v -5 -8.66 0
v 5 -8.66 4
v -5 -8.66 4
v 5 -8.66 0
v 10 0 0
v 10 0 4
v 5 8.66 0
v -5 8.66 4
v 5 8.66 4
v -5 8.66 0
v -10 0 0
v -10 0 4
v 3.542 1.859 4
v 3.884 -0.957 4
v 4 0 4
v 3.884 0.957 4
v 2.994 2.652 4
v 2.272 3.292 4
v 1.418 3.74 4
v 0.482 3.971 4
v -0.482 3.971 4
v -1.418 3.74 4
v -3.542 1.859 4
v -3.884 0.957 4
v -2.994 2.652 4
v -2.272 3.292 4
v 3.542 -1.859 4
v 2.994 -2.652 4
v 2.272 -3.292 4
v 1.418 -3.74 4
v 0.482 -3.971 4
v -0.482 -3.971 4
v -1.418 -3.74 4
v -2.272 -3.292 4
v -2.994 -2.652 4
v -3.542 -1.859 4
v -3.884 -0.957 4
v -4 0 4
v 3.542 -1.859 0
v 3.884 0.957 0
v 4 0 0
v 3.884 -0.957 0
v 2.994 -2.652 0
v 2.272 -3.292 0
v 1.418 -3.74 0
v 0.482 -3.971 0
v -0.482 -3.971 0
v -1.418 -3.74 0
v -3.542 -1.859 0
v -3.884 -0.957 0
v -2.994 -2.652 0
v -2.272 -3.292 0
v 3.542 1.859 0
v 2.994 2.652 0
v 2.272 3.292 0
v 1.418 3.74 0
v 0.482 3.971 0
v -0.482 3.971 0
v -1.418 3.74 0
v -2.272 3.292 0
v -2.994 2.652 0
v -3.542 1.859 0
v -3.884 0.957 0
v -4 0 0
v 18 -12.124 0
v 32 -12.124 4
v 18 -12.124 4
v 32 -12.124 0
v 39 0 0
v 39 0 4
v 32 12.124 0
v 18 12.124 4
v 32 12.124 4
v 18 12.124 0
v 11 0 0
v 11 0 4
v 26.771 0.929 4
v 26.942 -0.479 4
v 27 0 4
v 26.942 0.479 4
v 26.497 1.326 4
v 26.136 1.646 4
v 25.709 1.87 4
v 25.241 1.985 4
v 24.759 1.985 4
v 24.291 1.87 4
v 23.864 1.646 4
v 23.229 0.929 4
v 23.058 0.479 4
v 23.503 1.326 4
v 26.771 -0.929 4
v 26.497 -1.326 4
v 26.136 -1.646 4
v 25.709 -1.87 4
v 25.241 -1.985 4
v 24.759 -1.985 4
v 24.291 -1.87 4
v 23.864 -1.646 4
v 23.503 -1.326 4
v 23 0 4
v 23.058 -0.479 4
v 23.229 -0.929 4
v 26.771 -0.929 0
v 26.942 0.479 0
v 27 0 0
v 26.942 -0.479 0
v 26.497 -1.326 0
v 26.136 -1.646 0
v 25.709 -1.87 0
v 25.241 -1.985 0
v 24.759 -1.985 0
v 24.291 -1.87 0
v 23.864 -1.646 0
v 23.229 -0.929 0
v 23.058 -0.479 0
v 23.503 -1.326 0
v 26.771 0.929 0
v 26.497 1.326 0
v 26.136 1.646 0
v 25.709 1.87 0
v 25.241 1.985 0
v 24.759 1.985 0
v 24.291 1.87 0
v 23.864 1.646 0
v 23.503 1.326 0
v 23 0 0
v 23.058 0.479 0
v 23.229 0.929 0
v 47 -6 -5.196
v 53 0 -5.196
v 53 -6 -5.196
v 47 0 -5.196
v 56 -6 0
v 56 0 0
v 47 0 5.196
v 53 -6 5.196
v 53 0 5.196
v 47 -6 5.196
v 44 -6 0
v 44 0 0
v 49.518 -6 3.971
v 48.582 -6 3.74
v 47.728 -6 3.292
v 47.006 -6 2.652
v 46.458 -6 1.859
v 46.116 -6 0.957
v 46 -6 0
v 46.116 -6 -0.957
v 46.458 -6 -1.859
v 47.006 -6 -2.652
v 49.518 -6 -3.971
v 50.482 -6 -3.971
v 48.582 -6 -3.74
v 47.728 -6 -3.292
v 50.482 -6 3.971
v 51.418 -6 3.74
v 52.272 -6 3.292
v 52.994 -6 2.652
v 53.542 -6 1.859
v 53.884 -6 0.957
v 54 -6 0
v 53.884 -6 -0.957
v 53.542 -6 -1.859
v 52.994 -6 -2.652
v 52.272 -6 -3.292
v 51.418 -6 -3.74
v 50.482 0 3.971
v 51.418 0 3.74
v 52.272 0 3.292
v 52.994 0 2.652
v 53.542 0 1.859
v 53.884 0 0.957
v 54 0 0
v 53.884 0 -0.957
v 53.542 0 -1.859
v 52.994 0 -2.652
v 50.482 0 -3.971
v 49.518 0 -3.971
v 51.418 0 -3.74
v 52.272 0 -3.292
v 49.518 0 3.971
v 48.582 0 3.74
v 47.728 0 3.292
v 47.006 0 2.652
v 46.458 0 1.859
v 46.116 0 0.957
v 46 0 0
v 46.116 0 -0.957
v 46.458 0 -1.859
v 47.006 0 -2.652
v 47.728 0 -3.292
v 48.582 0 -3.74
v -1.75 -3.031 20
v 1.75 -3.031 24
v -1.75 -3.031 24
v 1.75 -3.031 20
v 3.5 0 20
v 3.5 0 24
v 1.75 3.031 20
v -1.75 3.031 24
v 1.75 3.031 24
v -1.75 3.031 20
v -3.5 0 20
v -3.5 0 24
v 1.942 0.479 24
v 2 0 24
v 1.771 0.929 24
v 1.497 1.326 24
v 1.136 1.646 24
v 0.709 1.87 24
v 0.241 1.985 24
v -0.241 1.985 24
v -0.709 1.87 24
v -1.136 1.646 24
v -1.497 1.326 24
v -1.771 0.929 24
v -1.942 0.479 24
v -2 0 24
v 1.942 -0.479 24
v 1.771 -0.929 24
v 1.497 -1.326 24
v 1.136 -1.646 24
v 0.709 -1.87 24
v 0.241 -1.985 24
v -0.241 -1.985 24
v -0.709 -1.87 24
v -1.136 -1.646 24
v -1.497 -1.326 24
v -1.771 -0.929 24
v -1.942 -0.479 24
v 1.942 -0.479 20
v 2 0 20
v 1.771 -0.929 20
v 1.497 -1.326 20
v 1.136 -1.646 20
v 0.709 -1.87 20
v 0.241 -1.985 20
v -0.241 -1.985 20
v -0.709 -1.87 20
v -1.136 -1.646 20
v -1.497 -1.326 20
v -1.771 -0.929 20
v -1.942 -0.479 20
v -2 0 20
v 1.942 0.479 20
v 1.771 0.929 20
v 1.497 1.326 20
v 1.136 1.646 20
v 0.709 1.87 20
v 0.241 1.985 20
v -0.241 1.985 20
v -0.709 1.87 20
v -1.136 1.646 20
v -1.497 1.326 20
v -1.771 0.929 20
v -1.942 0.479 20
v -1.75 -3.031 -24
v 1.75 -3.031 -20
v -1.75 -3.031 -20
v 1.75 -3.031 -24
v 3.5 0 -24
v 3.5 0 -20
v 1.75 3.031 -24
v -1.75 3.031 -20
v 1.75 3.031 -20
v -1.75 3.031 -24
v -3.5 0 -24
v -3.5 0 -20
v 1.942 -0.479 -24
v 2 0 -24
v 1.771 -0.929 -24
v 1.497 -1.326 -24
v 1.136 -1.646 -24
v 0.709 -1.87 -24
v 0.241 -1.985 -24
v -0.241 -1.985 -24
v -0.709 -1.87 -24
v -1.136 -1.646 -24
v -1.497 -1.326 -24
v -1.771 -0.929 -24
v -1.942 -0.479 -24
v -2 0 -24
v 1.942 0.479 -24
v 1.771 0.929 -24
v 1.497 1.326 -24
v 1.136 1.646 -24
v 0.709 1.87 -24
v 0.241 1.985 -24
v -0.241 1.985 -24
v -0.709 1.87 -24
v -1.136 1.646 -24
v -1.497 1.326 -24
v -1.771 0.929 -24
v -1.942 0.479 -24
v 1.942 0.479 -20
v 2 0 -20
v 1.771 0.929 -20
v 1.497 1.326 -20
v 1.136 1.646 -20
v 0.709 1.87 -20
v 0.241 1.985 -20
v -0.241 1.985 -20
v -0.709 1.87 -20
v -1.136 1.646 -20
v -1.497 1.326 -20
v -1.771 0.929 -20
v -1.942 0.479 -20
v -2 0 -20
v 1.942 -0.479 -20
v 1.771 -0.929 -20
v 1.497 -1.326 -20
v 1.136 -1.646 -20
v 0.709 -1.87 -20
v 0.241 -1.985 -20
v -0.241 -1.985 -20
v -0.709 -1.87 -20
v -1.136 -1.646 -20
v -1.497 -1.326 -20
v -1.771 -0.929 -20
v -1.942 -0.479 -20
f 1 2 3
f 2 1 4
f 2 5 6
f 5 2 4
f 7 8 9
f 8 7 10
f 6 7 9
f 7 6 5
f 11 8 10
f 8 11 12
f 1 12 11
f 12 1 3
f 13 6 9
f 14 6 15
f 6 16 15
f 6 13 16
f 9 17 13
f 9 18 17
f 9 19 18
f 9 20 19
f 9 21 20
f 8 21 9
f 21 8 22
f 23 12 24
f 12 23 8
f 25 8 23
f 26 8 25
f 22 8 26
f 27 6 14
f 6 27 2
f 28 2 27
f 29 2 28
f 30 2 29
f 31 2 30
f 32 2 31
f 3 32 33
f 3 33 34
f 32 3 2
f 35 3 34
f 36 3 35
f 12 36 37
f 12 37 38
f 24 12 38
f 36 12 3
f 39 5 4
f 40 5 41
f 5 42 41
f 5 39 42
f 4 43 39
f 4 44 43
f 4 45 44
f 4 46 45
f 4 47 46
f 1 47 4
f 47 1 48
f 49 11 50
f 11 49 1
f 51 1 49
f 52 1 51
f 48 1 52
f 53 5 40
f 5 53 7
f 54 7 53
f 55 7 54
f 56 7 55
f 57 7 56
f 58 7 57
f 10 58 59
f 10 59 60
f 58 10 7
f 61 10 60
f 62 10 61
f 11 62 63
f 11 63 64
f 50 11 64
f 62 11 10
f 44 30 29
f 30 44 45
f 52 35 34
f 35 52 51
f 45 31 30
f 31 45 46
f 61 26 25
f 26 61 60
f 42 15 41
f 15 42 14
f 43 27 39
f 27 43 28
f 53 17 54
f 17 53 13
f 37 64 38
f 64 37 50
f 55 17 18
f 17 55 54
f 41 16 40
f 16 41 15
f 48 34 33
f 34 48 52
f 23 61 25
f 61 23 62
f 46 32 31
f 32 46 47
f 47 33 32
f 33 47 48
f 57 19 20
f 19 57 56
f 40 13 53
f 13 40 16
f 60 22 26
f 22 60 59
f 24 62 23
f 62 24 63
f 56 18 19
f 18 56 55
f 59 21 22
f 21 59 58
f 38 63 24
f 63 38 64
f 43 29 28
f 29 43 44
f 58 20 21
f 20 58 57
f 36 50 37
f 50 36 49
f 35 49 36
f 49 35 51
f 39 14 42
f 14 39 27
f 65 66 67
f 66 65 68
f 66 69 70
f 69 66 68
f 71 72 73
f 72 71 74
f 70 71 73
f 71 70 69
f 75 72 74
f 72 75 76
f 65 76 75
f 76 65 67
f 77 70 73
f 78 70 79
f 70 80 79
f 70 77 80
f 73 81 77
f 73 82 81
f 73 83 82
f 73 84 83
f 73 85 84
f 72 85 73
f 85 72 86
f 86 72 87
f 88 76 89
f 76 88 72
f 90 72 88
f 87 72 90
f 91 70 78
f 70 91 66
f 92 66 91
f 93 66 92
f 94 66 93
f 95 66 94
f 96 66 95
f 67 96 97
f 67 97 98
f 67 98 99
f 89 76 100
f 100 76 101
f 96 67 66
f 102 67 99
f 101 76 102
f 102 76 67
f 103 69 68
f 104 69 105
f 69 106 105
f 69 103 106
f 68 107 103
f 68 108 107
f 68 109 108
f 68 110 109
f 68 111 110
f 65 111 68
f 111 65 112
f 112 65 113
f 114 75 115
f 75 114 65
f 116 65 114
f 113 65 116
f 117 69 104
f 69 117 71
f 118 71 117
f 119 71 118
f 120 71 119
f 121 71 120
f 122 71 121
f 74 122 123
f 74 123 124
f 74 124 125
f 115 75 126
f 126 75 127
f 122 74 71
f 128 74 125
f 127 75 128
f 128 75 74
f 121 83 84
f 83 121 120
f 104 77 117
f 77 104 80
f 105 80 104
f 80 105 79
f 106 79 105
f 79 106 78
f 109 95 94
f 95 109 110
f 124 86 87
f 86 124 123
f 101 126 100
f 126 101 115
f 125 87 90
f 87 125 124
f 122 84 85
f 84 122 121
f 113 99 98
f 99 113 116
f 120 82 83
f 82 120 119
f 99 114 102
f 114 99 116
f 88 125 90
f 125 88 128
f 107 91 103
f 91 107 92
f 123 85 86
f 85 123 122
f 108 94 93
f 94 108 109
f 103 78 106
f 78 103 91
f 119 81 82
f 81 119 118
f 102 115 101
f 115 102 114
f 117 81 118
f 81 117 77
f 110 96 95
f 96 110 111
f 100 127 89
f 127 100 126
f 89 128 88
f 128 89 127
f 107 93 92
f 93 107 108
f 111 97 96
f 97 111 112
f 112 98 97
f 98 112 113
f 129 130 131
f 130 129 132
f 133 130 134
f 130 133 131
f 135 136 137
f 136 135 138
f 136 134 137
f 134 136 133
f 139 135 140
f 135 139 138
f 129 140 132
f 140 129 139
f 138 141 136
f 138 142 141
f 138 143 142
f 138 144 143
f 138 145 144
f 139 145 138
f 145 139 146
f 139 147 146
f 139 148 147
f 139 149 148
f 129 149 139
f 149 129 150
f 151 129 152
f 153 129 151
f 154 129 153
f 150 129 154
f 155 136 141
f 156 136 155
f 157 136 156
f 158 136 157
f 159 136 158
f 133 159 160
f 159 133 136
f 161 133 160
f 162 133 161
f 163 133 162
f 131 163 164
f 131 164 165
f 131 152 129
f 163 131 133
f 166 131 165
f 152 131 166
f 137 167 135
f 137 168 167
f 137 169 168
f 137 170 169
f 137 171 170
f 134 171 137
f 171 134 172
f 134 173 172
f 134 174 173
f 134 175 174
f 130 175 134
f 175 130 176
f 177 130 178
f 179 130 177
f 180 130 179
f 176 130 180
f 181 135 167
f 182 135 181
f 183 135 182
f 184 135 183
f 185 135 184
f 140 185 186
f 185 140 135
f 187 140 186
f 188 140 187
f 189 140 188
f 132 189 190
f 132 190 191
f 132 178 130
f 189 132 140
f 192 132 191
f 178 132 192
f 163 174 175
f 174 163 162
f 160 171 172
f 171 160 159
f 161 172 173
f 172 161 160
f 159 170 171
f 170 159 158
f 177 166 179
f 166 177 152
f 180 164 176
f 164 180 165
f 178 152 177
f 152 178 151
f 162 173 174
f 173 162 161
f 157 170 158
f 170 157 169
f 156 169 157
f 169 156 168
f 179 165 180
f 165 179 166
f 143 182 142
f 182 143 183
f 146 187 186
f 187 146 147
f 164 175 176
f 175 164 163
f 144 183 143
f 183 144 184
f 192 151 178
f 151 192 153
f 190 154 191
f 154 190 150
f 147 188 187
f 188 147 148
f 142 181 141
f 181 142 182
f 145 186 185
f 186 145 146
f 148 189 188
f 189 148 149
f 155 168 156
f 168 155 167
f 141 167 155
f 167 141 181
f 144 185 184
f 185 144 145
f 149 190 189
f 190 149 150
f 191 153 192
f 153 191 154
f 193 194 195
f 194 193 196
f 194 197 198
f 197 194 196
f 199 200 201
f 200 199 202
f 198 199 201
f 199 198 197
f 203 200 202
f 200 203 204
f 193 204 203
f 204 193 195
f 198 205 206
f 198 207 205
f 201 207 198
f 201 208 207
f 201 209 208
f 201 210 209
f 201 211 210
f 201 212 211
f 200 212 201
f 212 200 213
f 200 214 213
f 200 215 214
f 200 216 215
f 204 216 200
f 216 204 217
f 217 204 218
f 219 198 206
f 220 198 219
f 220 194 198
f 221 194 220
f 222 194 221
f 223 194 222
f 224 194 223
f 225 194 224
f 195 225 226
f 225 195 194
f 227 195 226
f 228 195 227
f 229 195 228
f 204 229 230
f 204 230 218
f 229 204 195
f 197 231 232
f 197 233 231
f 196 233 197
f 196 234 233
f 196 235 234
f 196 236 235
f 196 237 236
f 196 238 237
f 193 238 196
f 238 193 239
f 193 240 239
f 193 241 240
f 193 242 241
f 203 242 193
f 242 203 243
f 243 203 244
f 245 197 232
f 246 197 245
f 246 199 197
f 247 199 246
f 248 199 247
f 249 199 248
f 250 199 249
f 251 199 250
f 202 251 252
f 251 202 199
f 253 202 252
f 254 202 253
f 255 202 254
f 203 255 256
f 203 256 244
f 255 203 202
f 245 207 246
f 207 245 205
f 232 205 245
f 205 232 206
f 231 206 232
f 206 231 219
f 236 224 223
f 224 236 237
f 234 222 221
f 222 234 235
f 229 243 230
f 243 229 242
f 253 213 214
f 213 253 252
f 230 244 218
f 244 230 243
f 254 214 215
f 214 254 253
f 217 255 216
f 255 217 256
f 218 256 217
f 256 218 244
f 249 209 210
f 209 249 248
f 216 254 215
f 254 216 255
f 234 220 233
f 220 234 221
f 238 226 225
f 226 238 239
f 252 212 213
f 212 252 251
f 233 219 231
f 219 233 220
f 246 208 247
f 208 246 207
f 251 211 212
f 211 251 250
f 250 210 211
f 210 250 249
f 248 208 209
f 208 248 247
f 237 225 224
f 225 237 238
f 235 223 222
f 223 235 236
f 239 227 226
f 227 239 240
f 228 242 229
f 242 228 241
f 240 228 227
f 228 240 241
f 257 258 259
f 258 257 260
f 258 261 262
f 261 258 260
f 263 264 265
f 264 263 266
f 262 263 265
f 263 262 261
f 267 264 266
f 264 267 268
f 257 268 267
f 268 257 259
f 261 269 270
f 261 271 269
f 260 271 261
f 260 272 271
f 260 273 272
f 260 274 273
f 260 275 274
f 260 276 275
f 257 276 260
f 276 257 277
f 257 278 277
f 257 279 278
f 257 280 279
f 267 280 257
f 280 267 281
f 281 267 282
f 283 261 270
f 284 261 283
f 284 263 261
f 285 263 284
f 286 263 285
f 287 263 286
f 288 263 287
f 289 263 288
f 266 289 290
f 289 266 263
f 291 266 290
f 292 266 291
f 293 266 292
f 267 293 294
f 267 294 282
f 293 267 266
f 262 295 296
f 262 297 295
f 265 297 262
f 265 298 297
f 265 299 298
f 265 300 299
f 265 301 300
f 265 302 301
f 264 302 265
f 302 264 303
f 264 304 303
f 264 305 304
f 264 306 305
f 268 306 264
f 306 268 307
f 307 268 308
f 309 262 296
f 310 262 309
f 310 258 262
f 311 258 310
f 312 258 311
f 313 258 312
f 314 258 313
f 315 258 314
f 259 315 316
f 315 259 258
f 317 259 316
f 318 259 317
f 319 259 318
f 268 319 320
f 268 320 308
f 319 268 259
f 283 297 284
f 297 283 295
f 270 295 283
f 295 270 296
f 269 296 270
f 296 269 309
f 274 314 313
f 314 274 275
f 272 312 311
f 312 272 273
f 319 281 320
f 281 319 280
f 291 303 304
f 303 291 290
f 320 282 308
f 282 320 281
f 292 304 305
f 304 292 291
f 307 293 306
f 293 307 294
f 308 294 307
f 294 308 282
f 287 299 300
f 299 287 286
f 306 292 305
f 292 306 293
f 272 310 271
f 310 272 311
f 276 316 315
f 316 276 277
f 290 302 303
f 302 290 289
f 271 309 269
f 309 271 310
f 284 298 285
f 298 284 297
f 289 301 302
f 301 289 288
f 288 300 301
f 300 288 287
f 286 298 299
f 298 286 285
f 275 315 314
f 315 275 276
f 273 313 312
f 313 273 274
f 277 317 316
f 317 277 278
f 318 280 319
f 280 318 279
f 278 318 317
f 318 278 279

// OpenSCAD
//.....................................................
module piulita(raza_exterior, raza_interior, grosime)
{
    difference(){
        cylinder(h = grosime, r = raza_exterior, $fn = 6);
    
        translate ([0, 0, -1]) cylinder(h = grosime + 2, r = raza_interior, $fn = 26);
    }
}
//......................................................
module piulita_M4()
{
   piulita(3.5, 2, 4); 
}
//.....................................................

color ("red") piulita(10, 4, 4);
color ("yellow") translate ([25, 0, 0]) piulita(14, 2, 4);

color("blue") translate ([50, 0, 0]) rotate([90, 0, 0]) piulita(6, 4, 6);

translate ([0, 0, 20]) piulita_M4();

mirror ([0, 0, 1])translate ([0, 0, 20]) piulita_M4();
